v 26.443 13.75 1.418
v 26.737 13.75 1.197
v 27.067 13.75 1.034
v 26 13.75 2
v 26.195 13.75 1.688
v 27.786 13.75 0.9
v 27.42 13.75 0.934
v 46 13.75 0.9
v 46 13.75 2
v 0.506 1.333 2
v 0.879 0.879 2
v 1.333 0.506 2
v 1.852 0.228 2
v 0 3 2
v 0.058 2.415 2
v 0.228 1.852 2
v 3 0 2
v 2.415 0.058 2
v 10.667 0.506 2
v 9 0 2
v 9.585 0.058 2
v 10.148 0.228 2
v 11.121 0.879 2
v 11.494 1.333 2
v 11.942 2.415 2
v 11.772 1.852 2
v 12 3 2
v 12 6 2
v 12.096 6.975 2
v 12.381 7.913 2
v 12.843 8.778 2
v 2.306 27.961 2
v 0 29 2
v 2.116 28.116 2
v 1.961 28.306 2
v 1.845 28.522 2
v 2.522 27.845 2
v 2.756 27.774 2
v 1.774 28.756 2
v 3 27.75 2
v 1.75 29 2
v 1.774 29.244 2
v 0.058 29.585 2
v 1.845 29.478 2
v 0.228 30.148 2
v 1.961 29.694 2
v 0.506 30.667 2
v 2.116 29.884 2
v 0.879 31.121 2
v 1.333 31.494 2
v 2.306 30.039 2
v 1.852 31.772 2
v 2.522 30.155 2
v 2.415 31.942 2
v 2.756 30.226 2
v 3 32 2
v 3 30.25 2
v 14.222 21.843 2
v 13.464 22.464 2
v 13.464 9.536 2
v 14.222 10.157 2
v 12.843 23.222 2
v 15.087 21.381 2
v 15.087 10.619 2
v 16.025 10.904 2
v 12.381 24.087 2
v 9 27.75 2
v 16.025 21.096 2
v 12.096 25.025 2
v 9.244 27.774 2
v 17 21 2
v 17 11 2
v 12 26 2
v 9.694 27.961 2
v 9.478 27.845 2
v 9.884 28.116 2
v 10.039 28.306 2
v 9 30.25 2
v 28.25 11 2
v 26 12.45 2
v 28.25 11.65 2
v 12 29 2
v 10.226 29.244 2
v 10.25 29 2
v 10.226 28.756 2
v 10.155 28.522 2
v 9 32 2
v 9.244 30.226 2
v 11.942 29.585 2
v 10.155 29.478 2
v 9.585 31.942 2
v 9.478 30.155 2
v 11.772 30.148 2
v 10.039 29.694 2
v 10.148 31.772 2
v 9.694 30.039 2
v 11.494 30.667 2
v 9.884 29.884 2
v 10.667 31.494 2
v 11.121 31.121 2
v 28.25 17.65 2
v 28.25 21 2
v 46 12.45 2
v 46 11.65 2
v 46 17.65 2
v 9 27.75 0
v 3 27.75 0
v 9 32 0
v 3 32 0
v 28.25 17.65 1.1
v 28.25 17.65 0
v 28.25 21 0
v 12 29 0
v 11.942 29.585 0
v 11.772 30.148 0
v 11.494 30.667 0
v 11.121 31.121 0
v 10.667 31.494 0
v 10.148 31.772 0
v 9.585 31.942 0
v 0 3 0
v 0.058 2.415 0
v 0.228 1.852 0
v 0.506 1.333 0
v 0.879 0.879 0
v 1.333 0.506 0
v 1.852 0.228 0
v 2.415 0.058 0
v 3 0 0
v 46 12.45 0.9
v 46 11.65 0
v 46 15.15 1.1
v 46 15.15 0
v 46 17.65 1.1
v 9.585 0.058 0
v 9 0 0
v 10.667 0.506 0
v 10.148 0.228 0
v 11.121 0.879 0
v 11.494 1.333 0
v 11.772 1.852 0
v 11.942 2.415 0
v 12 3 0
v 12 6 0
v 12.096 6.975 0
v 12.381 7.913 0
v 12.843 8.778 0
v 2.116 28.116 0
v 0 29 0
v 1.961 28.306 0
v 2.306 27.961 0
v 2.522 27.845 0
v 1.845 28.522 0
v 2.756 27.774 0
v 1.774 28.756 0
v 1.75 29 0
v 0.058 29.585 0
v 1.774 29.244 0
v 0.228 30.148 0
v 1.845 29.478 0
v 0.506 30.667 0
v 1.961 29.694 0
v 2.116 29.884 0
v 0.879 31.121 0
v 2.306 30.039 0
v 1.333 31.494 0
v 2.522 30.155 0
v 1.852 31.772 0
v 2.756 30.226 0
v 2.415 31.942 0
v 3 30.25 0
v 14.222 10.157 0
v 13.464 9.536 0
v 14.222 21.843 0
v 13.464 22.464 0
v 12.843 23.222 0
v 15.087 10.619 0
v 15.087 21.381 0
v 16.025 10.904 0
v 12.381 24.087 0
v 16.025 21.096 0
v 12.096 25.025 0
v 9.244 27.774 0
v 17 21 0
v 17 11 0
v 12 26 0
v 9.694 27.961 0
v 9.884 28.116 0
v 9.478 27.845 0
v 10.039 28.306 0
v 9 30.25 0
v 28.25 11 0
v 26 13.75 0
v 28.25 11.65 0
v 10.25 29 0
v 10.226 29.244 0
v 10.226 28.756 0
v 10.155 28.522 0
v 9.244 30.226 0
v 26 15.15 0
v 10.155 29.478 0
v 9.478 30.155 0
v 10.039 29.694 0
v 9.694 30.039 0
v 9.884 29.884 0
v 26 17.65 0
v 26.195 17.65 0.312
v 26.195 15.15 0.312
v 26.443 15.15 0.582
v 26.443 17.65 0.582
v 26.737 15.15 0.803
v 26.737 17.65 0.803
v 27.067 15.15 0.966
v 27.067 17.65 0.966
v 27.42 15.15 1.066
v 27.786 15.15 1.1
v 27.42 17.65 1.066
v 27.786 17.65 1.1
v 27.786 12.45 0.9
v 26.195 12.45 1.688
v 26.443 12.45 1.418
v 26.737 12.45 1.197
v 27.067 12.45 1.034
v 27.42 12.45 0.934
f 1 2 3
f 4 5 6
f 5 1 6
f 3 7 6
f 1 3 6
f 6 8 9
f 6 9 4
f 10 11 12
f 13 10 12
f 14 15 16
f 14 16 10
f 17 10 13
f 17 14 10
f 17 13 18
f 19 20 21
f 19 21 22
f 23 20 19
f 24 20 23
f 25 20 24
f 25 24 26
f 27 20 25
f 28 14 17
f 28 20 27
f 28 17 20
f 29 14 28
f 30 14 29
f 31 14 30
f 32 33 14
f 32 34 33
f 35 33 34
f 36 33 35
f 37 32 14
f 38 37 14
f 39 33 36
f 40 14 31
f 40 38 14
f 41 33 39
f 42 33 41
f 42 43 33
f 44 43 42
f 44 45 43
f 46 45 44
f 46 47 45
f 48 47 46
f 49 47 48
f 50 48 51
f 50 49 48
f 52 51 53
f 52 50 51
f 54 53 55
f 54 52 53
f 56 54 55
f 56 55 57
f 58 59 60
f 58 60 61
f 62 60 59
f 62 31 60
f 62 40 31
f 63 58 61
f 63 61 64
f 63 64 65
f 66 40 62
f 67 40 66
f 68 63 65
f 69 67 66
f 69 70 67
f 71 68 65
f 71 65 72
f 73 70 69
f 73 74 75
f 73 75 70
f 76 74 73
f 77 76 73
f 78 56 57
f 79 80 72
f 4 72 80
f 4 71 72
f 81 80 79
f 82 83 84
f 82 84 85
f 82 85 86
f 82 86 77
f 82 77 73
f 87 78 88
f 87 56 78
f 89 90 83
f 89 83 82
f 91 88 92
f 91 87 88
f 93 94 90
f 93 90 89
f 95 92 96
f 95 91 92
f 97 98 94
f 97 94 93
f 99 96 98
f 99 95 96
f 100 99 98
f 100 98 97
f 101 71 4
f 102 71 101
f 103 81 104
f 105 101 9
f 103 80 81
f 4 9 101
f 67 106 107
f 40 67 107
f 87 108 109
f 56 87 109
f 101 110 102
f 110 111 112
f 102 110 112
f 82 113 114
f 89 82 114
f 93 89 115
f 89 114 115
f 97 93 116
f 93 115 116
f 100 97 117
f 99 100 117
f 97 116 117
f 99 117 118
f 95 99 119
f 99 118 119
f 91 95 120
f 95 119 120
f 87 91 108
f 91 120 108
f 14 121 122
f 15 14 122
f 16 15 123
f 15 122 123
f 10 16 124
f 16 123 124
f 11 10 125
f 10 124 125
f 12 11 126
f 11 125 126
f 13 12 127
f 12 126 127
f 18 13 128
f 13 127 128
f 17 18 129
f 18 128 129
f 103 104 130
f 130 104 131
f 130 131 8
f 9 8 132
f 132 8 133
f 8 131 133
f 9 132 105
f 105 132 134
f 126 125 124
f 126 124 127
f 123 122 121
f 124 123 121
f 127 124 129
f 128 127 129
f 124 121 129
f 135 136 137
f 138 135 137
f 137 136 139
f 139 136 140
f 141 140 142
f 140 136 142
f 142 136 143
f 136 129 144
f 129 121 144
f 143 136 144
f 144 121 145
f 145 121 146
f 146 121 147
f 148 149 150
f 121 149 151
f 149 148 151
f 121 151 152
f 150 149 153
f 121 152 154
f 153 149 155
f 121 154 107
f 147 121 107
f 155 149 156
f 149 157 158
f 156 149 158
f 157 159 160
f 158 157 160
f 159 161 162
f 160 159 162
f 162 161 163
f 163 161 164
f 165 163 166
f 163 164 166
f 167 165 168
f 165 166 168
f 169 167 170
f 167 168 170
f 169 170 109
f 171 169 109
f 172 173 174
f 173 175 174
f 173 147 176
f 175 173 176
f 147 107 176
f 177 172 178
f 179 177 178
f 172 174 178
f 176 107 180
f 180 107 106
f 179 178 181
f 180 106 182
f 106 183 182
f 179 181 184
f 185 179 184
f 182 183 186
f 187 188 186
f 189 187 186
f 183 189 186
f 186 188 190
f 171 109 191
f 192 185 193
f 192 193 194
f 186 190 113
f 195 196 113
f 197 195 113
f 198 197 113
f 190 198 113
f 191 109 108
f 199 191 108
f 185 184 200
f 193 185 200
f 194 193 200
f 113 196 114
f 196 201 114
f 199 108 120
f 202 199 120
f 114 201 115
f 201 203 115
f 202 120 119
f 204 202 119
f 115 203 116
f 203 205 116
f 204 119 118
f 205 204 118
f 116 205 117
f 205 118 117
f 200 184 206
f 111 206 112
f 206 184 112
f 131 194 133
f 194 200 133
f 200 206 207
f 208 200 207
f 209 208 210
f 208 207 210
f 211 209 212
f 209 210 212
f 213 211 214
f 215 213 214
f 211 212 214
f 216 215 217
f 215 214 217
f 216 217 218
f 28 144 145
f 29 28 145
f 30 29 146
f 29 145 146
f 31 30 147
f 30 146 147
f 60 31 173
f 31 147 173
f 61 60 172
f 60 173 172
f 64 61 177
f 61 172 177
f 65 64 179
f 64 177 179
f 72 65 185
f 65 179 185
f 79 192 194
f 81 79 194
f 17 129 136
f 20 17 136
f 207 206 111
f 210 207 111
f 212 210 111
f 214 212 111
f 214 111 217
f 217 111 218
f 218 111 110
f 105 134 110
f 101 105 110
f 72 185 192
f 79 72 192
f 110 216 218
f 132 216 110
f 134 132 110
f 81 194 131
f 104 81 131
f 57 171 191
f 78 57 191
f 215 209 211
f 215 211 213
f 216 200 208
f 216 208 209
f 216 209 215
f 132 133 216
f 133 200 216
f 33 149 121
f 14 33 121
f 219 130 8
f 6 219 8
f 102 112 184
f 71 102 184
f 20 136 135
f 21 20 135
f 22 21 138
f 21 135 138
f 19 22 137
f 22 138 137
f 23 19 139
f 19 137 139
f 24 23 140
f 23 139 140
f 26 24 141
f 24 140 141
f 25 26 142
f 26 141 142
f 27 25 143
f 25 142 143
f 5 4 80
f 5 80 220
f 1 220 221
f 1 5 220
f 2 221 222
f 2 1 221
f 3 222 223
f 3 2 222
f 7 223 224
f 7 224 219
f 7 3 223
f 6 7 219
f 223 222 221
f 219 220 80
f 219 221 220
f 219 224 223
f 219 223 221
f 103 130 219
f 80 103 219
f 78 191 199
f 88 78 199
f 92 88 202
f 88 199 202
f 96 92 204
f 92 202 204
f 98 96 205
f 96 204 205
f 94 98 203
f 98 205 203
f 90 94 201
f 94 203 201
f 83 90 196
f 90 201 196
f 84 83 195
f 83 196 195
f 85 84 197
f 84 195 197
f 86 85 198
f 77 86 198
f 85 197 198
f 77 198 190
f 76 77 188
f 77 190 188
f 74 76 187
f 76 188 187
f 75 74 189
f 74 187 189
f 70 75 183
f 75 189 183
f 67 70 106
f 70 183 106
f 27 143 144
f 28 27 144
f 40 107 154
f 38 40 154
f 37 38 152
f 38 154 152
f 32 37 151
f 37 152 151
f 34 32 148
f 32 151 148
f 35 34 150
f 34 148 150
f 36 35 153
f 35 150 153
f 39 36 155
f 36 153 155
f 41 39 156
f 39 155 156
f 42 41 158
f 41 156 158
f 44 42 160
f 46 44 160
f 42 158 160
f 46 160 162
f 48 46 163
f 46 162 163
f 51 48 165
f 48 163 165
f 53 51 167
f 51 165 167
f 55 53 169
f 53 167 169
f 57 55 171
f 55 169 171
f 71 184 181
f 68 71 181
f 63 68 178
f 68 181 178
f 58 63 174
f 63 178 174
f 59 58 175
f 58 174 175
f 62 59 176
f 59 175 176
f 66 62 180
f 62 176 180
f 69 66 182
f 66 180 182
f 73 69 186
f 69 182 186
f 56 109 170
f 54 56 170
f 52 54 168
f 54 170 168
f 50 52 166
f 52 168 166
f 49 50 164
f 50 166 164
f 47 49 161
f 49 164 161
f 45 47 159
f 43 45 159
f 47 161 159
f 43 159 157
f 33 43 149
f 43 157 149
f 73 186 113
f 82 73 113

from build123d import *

# Parameters (mm, degrees)
F1_DEPTH    = 2
F2_W        = 1.3
F2_H        = 1.1
F2_W_2      = 2.5
F3_DEPTH    = 20
F4_T1_DEPTH = 1.3
F5_T4_DEPTH = 6.9651427749


# Not quite as in the source:
# - a fillet or chamfer that OpenCascade refuses, or shapes differently, is made with other operations: its cross-section is extruded or revolved along the edge and cut away or added


with BuildPart() as f1:
    # F0 (on Top) → F1 (new body)
    with BuildSketch(Plane.XY):
        with BuildLine():
            ThreePointArc((0, 3), (0.8786796564, 0.8786796564), (3, 0))
            Line((3, 0), (9, 0))
            ThreePointArc((9, 0), (11.1213203436, 0.8786796564), (12, 3))
            Line((12, 3), (12, 6))
            ThreePointArc((12, 6), (13.4644660941, 9.5355339059), (17, 11))
            Line((17, 11), (28.25, 11))
            Line((28.25, 11), (28.25, 11.65))
            Line((28.25, 11.65), (46, 11.65))
            Line((46, 11.65), (46, 17.65))
            Line((46, 17.65), (28.25, 17.65))
            Line((28.25, 17.65), (28.25, 21))
            Line((28.25, 21), (17, 21))
            ThreePointArc((17, 21), (13.4644660941, 22.4644660941), (12, 26))
            Line((12, 26), (12, 29))
            ThreePointArc((12, 29), (11.1213203436, 31.1213203436), (9, 32))
            Line((9, 32), (3, 32))
            ThreePointArc((3, 32), (0.8786796564, 31.1213203436), (0, 29))
            Line((0, 29), (0, 3))
        make_face()
        with BuildLine():
            ThreePointArc((3, 27.75), (1.75, 29), (3, 30.25))
            Line((3, 30.25), (9, 30.25))
            ThreePointArc((9, 30.25), (10.25, 29), (9, 27.75))
            Line((9, 27.75), (3, 27.75))
        make_face(mode=Mode.SUBTRACT)
    extrude(amount=F1_DEPTH)

    # F2 (on face) → F3 (cut)
    with BuildSketch(Plane.YZ.offset(46)):
        with Locations((13.1, 1.45)):
            Rectangle(F2_W, F2_H)
        with Locations((16.4, 0.55)):
            Rectangle(F2_W_2, F2_H)
    extrude(amount=-F3_DEPTH, mode=Mode.SUBTRACT)

    # F4: fillet of radius 2 on 1 edges, made by hand

    # F4_s2 → F4_t1 (join)
    with BuildSketch(Plane.XZ.offset(-13.75)):
        with BuildLine():
            ThreePointArc((26, 2), (26.7372482618, 1.1970613634), (27.7860571099, 0.9))
            Line((27.7860571099, 0.9), (26, 0.9))
            Line((26, 0.9), (26, 2))
        make_face()
    extrude(amount=F4_T1_DEPTH)

    # F5: fillet of radius 2 on 1 edges, made by hand


with BuildPart() as f5_tool2:
    # F5_s3 → F5_t4 (new body)
    with BuildSketch(Plane.XZ.offset(-17.65)):
        with BuildLine():
            ThreePointArc((26, 0), (26.7372482618, 0.8029386366), (27.7860571099, 1.1))
            Line((27.7860571099, 1.1), (26, 1.1))
            Line((26, 1.1), (26, 0))
        make_face()
    extrude(amount=F5_T4_DEPTH)

    split(bisect_by=Plane.XZ.offset(-13.75), keep=Keep.BOTTOM)


with BuildPart() as f1_1:
    add(f1.part)

    # F5_t1: union F5_tool2
    add(f5_tool2.part)


solid = f1_1.part
